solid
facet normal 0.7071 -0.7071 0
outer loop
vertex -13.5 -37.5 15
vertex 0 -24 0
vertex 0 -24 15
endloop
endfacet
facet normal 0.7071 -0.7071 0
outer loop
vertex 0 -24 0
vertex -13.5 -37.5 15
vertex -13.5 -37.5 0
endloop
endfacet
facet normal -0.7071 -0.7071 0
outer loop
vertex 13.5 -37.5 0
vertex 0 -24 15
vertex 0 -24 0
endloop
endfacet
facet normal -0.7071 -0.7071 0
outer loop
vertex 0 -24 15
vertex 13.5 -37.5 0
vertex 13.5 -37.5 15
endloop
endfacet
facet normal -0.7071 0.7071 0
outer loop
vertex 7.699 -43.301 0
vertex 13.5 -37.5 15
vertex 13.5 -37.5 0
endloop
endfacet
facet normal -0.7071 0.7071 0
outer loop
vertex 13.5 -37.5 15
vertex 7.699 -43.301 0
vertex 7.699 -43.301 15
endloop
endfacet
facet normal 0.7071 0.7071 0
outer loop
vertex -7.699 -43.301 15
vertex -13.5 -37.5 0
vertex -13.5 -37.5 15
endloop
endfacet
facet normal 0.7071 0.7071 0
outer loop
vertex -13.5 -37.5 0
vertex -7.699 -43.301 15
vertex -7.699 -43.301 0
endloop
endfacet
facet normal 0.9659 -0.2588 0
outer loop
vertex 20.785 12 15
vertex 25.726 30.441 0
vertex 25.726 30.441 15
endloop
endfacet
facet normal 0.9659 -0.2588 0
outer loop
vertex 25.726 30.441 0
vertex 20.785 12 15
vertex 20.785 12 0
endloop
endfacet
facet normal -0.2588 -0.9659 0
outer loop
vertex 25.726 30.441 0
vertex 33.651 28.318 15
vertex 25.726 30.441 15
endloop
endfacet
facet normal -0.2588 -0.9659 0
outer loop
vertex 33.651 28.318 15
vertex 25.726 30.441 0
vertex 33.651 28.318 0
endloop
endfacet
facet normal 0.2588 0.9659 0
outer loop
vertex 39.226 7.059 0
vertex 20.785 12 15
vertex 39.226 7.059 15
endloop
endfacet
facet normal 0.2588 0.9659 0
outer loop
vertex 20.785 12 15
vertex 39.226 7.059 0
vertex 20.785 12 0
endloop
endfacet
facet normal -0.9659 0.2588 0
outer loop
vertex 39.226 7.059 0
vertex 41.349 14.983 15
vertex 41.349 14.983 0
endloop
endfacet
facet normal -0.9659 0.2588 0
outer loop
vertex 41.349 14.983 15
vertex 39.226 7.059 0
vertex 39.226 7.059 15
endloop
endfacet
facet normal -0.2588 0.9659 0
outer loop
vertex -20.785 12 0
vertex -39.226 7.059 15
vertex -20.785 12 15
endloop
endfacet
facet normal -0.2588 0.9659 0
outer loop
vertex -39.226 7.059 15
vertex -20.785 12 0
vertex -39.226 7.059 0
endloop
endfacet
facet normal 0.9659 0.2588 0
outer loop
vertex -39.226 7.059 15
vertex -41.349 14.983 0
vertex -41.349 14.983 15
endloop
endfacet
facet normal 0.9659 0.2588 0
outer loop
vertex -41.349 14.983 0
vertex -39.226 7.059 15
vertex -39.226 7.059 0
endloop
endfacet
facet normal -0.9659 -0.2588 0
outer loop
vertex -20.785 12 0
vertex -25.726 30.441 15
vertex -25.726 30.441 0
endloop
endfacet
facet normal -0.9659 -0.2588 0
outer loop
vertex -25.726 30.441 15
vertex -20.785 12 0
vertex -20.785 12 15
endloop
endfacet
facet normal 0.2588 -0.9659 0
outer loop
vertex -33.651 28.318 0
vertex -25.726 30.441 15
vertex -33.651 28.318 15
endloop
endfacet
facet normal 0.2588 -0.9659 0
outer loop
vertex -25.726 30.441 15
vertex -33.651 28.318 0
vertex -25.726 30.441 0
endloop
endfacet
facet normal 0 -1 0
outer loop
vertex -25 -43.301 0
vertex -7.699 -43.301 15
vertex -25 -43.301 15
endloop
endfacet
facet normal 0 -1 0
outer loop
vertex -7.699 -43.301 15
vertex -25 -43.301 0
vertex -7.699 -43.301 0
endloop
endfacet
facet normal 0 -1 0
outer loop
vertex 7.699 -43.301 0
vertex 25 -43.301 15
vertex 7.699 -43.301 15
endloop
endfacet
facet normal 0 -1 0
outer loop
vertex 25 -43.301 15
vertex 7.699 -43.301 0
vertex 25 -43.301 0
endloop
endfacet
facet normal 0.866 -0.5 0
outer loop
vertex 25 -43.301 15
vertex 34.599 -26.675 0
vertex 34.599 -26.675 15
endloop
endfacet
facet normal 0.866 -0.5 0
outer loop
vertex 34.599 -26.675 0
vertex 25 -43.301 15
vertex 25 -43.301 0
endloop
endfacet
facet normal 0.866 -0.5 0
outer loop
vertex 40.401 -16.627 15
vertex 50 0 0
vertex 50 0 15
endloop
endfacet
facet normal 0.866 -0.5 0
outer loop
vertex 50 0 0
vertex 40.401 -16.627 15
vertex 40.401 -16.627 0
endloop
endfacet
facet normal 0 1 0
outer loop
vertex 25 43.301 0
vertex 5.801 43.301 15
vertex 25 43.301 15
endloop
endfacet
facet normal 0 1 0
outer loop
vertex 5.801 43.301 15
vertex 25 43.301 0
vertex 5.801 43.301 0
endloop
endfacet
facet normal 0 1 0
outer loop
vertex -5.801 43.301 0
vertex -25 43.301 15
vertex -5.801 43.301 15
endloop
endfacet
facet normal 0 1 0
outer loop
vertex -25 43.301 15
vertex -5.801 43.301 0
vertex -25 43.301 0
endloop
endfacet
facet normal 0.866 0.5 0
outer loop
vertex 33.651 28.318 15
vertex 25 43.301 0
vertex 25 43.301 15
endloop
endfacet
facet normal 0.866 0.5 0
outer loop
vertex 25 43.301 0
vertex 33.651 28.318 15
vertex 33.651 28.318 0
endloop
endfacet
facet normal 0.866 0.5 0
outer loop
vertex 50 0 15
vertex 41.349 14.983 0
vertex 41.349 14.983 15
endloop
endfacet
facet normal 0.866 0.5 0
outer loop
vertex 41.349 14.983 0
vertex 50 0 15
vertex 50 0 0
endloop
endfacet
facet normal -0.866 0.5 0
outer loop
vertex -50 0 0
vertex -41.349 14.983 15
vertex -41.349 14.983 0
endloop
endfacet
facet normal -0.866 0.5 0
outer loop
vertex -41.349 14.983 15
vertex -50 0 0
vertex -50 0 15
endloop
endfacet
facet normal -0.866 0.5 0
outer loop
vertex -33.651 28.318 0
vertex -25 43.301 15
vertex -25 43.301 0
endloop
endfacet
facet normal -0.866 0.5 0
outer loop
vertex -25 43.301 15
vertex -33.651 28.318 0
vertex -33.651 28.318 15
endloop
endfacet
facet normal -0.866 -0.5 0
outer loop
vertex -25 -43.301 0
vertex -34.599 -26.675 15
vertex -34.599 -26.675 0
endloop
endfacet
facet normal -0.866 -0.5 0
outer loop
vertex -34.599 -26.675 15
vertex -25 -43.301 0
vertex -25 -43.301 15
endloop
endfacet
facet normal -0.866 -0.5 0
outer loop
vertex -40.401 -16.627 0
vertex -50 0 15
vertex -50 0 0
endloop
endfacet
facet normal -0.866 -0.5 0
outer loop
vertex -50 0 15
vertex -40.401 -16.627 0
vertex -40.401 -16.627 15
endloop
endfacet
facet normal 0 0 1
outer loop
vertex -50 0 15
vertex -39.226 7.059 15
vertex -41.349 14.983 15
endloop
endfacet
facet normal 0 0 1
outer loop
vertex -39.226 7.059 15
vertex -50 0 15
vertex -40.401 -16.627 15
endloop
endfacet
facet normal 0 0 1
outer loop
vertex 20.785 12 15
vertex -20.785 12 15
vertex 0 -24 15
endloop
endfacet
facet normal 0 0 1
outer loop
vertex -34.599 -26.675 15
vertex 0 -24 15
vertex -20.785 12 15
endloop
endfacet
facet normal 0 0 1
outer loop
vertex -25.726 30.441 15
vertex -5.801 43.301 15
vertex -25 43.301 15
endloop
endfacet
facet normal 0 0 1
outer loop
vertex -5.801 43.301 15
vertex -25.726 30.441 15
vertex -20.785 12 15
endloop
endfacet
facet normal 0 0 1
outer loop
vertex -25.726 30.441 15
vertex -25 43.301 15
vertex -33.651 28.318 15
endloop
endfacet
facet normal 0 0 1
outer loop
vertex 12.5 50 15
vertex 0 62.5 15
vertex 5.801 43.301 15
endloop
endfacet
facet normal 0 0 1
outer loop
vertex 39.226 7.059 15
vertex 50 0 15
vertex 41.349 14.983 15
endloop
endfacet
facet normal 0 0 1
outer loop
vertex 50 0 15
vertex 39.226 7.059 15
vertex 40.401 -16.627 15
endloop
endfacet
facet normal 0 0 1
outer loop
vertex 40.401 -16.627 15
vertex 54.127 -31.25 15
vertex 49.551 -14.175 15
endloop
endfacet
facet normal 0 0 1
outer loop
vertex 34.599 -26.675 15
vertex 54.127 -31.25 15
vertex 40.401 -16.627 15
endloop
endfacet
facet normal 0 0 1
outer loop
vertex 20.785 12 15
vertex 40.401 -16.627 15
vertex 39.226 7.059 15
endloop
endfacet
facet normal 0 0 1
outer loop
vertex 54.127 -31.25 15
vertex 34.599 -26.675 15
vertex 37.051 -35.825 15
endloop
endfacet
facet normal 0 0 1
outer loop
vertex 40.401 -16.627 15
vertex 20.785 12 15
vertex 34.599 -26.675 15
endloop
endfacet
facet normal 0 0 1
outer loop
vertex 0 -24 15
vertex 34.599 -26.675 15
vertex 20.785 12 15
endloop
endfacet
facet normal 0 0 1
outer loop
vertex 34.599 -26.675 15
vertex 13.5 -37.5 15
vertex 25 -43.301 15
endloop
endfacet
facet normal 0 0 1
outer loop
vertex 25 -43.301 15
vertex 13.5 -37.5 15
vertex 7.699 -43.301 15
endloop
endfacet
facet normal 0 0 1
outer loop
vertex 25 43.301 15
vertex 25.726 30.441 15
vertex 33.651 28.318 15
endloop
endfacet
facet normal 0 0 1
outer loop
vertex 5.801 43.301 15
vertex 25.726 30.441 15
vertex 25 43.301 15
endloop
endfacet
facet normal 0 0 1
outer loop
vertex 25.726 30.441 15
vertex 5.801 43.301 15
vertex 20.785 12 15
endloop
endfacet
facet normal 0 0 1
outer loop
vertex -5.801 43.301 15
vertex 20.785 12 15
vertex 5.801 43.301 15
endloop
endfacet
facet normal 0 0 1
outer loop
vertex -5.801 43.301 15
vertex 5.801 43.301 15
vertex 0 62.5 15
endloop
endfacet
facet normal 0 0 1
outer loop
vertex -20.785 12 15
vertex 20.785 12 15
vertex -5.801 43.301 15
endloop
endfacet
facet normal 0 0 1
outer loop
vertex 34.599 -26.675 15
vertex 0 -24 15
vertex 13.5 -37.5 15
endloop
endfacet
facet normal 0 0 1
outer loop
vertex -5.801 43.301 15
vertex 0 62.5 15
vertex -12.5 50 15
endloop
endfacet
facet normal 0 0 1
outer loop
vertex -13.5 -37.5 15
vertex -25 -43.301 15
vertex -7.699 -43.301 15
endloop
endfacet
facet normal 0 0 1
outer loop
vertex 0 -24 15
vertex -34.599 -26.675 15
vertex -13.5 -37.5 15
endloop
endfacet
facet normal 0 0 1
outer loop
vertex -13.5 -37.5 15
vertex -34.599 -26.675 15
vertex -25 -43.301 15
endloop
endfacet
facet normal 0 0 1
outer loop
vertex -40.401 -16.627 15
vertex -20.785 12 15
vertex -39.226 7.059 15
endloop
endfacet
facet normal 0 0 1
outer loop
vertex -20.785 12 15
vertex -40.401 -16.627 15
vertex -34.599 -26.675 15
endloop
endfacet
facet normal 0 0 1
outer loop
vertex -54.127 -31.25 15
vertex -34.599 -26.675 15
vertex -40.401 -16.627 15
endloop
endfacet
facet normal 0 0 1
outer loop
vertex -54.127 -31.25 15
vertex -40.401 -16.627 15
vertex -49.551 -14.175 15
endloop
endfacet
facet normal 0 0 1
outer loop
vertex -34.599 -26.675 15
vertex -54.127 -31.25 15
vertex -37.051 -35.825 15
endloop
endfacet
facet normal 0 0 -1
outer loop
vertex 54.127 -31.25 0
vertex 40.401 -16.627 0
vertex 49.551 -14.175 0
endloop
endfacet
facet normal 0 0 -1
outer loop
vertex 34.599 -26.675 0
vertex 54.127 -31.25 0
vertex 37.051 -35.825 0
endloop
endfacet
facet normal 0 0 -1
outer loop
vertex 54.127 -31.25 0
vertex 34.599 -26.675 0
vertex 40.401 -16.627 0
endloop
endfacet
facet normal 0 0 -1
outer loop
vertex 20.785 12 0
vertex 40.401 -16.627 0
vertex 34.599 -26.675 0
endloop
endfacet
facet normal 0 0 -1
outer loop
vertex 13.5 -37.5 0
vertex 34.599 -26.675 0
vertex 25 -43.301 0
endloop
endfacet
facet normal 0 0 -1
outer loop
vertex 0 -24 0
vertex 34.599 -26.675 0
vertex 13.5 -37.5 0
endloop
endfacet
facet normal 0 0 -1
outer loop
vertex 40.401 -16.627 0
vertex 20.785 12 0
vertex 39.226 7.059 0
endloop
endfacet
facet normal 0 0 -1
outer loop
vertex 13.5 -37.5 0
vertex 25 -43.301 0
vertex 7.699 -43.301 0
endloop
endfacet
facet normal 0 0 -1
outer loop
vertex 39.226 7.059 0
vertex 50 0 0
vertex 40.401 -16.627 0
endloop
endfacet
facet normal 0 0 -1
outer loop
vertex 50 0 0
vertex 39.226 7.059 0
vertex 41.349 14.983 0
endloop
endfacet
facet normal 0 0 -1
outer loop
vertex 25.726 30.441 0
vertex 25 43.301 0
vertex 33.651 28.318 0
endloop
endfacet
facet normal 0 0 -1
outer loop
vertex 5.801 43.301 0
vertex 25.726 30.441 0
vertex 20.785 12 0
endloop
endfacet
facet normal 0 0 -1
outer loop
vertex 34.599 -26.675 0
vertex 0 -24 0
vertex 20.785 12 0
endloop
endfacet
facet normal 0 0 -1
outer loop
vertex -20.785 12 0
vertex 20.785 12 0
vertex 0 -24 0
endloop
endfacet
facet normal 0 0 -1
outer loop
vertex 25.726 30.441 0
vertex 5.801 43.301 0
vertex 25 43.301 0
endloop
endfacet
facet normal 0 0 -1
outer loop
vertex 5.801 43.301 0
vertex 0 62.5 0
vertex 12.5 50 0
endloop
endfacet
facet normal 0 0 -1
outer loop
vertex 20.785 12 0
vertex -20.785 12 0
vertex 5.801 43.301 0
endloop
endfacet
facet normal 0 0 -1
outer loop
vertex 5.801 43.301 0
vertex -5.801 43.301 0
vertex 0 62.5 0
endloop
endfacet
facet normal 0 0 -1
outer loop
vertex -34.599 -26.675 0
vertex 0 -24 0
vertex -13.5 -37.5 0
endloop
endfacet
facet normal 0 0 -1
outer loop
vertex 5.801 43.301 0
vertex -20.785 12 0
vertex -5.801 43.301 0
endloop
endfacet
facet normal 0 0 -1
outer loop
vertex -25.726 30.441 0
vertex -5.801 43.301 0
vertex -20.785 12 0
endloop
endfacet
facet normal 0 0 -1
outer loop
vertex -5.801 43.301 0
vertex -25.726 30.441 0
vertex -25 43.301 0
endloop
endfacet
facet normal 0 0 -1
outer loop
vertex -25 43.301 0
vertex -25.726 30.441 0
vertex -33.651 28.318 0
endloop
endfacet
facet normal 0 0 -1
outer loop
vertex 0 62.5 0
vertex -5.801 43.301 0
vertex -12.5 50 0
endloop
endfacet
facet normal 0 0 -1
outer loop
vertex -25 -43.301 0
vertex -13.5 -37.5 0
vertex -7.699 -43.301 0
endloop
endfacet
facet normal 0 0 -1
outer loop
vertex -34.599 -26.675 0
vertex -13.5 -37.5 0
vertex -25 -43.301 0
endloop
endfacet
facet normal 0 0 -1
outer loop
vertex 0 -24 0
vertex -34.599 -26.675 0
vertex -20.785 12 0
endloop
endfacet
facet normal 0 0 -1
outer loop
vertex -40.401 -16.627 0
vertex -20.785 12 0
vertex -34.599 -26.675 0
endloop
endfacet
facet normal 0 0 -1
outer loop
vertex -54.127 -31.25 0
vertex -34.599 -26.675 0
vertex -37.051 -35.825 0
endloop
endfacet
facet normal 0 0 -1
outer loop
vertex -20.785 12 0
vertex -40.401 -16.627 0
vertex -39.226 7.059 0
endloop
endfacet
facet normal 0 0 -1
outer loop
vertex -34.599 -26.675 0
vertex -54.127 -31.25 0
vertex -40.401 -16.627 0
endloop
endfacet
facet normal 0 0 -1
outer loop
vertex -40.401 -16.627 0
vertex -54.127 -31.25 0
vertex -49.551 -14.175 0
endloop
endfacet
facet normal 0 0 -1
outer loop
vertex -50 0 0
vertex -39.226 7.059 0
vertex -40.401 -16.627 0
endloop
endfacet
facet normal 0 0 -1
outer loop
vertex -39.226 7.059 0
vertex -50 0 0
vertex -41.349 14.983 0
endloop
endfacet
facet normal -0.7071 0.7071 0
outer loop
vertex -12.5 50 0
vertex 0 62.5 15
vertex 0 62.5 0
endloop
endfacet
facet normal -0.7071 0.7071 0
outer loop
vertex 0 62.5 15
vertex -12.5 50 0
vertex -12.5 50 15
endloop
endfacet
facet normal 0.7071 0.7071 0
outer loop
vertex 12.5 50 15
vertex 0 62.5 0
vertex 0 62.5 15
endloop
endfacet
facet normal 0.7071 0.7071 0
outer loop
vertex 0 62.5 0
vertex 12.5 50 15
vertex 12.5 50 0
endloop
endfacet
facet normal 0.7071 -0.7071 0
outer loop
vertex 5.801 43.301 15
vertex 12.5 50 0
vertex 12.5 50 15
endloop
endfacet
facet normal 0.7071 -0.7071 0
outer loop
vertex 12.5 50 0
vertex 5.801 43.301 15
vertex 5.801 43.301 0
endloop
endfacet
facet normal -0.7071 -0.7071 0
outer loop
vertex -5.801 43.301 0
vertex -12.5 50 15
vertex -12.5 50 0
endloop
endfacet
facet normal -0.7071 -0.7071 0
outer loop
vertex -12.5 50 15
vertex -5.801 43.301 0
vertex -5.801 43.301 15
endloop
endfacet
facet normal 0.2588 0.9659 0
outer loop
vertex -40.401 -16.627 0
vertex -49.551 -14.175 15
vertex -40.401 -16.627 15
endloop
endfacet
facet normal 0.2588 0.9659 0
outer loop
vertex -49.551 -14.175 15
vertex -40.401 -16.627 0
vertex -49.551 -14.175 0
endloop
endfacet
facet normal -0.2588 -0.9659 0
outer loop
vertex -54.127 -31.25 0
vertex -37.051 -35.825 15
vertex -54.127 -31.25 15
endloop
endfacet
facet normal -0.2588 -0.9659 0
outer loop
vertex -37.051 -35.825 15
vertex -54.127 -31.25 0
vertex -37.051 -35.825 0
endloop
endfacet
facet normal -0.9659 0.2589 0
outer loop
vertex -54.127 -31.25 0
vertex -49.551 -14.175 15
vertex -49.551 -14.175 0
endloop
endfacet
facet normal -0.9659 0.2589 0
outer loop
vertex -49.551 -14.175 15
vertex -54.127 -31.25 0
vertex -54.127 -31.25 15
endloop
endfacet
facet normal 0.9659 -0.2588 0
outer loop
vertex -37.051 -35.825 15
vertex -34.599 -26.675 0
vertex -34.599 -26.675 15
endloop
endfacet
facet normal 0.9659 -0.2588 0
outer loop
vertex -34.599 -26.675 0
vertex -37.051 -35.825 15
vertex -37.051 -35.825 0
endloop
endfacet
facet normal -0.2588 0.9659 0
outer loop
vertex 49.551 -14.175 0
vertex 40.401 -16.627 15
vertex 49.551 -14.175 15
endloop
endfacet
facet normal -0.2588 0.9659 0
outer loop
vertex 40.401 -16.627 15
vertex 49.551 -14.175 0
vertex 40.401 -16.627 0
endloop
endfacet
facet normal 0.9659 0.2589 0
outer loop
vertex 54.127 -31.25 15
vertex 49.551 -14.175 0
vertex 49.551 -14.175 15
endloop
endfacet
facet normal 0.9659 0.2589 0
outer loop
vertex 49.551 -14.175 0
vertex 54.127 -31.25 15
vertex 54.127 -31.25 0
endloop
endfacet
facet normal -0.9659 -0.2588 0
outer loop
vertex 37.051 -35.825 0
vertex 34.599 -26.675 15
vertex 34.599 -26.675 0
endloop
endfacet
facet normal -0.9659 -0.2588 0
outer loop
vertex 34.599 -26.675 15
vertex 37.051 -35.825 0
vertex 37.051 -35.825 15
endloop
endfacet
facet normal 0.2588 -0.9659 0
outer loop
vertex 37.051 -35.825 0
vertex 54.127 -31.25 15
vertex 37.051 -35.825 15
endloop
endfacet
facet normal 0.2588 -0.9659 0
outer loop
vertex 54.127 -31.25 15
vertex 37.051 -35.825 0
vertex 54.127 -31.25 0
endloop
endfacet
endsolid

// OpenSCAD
//Copyright Mateo Carreras 2016. All rights reserved.
//
//PokeyOne's Hexagonal Connectors

//customize these:

//height of block DEFAULT=15
height = 15; 
//space between male and female connector ends DEFAULT=1
gap = 1; 
//scale of the model DEFAULT=1
pieceScale = 1; 

piece();

module piece(){
    //Don't touch unless you know what you're doing
    //DEFAULT=3 NOTE="must be multiple of 3, and odd"
    sides = 3; 
    //Don't touch unless you know what you're doing
    //totalSides
    totalSides = sides*2;
    //Don't touch unless you know what you're doing
    //size of connectors DEFAULT=12.5
    connectorRadius = 12.5; 
    //Don't touch unless you know what you're doing
    //size of block DEFAULT=50
    pieceRadius = 50; 

    scale(pieceScale){
        difference(){
            cylinder(h=height, r=pieceRadius, center=false, $fn=totalSides);
            for(i = [0 : sides-1]) {
                rotate([0, 0, (360/sides)*i]){
                    translate([0, -1*pieceRadius+connectorRadius, 0]){
                        cylinder(h=height*2.5, r=connectorRadius+gap, center=true, $fn=4);
                    }
                }
            }
        }

        for(i = [0 : sides-1]) {
            rotate([0, 0, (360/sides)*i]){
                translate([0, pieceRadius, 0]){
                    cylinder(h=height, r=connectorRadius, center=false, $fn=4);
                }
            }
        }
    }
}
